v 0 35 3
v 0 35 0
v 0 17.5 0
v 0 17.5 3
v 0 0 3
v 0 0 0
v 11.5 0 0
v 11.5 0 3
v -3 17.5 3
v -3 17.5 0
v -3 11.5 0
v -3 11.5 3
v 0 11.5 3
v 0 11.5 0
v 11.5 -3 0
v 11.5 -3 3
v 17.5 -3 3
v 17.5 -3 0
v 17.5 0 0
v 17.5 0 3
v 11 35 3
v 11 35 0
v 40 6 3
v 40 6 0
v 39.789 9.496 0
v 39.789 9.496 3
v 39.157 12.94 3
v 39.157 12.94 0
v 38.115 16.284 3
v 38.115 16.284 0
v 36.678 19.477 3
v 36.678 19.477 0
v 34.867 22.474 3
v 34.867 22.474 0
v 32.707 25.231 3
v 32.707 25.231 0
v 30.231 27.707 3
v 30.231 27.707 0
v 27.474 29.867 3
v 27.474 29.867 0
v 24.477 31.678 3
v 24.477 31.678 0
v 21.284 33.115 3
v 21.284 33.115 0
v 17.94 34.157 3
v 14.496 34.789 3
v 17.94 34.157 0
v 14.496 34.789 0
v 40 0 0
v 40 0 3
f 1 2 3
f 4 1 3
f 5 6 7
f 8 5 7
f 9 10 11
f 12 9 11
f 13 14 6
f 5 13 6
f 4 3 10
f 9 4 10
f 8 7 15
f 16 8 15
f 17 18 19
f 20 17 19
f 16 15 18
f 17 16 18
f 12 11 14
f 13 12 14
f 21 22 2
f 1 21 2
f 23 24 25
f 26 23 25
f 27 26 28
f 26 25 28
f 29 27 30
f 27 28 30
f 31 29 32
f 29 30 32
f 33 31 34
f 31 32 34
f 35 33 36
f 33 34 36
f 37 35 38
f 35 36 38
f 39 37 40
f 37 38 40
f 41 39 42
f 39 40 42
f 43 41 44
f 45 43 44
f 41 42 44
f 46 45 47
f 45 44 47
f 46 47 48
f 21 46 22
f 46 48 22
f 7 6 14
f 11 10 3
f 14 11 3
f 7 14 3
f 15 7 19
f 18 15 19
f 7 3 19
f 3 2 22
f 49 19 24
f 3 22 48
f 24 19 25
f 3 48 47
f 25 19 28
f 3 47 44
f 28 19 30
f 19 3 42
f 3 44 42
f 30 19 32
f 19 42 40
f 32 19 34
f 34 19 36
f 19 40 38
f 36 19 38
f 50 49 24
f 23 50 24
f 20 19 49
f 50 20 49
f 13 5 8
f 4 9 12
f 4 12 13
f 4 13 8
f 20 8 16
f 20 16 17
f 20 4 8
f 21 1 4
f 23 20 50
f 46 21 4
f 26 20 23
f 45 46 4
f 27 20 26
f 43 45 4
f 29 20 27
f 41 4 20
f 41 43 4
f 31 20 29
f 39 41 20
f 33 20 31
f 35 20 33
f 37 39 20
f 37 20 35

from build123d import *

# Parameters (mm, degrees)
EXTRUDE_1_DEPTH = 3


with BuildPart() as part:
    # 草图1 → 凸台-拉伸1 (new body)
    with BuildSketch(Plane.XY):
        with BuildLine():
            Line((0, 17.5), (-3, 17.5))
            Line((-3, 17.5), (-3, 11.5))
            Line((-3, 11.5), (0, 11.5))
            Line((0, 11.5), (0, 0))
            Line((0, 0), (11.5, 0))
            Line((11.5, 0), (11.5, -3))
            Line((11.5, -3), (17.5, -3))
            Line((17.5, -3), (17.5, 0))
            Line((17.5, 0), (40, 0))
            Line((40, 0), (40, 6))
            ThreePointArc((40, 6), (31.506096654, 26.506096654), (11, 35))
            Line((11, 35), (0, 35))
            Line((0, 35), (0, 17.5))
        make_face()
    extrude(amount=EXTRUDE_1_DEPTH)


solid = part.part
